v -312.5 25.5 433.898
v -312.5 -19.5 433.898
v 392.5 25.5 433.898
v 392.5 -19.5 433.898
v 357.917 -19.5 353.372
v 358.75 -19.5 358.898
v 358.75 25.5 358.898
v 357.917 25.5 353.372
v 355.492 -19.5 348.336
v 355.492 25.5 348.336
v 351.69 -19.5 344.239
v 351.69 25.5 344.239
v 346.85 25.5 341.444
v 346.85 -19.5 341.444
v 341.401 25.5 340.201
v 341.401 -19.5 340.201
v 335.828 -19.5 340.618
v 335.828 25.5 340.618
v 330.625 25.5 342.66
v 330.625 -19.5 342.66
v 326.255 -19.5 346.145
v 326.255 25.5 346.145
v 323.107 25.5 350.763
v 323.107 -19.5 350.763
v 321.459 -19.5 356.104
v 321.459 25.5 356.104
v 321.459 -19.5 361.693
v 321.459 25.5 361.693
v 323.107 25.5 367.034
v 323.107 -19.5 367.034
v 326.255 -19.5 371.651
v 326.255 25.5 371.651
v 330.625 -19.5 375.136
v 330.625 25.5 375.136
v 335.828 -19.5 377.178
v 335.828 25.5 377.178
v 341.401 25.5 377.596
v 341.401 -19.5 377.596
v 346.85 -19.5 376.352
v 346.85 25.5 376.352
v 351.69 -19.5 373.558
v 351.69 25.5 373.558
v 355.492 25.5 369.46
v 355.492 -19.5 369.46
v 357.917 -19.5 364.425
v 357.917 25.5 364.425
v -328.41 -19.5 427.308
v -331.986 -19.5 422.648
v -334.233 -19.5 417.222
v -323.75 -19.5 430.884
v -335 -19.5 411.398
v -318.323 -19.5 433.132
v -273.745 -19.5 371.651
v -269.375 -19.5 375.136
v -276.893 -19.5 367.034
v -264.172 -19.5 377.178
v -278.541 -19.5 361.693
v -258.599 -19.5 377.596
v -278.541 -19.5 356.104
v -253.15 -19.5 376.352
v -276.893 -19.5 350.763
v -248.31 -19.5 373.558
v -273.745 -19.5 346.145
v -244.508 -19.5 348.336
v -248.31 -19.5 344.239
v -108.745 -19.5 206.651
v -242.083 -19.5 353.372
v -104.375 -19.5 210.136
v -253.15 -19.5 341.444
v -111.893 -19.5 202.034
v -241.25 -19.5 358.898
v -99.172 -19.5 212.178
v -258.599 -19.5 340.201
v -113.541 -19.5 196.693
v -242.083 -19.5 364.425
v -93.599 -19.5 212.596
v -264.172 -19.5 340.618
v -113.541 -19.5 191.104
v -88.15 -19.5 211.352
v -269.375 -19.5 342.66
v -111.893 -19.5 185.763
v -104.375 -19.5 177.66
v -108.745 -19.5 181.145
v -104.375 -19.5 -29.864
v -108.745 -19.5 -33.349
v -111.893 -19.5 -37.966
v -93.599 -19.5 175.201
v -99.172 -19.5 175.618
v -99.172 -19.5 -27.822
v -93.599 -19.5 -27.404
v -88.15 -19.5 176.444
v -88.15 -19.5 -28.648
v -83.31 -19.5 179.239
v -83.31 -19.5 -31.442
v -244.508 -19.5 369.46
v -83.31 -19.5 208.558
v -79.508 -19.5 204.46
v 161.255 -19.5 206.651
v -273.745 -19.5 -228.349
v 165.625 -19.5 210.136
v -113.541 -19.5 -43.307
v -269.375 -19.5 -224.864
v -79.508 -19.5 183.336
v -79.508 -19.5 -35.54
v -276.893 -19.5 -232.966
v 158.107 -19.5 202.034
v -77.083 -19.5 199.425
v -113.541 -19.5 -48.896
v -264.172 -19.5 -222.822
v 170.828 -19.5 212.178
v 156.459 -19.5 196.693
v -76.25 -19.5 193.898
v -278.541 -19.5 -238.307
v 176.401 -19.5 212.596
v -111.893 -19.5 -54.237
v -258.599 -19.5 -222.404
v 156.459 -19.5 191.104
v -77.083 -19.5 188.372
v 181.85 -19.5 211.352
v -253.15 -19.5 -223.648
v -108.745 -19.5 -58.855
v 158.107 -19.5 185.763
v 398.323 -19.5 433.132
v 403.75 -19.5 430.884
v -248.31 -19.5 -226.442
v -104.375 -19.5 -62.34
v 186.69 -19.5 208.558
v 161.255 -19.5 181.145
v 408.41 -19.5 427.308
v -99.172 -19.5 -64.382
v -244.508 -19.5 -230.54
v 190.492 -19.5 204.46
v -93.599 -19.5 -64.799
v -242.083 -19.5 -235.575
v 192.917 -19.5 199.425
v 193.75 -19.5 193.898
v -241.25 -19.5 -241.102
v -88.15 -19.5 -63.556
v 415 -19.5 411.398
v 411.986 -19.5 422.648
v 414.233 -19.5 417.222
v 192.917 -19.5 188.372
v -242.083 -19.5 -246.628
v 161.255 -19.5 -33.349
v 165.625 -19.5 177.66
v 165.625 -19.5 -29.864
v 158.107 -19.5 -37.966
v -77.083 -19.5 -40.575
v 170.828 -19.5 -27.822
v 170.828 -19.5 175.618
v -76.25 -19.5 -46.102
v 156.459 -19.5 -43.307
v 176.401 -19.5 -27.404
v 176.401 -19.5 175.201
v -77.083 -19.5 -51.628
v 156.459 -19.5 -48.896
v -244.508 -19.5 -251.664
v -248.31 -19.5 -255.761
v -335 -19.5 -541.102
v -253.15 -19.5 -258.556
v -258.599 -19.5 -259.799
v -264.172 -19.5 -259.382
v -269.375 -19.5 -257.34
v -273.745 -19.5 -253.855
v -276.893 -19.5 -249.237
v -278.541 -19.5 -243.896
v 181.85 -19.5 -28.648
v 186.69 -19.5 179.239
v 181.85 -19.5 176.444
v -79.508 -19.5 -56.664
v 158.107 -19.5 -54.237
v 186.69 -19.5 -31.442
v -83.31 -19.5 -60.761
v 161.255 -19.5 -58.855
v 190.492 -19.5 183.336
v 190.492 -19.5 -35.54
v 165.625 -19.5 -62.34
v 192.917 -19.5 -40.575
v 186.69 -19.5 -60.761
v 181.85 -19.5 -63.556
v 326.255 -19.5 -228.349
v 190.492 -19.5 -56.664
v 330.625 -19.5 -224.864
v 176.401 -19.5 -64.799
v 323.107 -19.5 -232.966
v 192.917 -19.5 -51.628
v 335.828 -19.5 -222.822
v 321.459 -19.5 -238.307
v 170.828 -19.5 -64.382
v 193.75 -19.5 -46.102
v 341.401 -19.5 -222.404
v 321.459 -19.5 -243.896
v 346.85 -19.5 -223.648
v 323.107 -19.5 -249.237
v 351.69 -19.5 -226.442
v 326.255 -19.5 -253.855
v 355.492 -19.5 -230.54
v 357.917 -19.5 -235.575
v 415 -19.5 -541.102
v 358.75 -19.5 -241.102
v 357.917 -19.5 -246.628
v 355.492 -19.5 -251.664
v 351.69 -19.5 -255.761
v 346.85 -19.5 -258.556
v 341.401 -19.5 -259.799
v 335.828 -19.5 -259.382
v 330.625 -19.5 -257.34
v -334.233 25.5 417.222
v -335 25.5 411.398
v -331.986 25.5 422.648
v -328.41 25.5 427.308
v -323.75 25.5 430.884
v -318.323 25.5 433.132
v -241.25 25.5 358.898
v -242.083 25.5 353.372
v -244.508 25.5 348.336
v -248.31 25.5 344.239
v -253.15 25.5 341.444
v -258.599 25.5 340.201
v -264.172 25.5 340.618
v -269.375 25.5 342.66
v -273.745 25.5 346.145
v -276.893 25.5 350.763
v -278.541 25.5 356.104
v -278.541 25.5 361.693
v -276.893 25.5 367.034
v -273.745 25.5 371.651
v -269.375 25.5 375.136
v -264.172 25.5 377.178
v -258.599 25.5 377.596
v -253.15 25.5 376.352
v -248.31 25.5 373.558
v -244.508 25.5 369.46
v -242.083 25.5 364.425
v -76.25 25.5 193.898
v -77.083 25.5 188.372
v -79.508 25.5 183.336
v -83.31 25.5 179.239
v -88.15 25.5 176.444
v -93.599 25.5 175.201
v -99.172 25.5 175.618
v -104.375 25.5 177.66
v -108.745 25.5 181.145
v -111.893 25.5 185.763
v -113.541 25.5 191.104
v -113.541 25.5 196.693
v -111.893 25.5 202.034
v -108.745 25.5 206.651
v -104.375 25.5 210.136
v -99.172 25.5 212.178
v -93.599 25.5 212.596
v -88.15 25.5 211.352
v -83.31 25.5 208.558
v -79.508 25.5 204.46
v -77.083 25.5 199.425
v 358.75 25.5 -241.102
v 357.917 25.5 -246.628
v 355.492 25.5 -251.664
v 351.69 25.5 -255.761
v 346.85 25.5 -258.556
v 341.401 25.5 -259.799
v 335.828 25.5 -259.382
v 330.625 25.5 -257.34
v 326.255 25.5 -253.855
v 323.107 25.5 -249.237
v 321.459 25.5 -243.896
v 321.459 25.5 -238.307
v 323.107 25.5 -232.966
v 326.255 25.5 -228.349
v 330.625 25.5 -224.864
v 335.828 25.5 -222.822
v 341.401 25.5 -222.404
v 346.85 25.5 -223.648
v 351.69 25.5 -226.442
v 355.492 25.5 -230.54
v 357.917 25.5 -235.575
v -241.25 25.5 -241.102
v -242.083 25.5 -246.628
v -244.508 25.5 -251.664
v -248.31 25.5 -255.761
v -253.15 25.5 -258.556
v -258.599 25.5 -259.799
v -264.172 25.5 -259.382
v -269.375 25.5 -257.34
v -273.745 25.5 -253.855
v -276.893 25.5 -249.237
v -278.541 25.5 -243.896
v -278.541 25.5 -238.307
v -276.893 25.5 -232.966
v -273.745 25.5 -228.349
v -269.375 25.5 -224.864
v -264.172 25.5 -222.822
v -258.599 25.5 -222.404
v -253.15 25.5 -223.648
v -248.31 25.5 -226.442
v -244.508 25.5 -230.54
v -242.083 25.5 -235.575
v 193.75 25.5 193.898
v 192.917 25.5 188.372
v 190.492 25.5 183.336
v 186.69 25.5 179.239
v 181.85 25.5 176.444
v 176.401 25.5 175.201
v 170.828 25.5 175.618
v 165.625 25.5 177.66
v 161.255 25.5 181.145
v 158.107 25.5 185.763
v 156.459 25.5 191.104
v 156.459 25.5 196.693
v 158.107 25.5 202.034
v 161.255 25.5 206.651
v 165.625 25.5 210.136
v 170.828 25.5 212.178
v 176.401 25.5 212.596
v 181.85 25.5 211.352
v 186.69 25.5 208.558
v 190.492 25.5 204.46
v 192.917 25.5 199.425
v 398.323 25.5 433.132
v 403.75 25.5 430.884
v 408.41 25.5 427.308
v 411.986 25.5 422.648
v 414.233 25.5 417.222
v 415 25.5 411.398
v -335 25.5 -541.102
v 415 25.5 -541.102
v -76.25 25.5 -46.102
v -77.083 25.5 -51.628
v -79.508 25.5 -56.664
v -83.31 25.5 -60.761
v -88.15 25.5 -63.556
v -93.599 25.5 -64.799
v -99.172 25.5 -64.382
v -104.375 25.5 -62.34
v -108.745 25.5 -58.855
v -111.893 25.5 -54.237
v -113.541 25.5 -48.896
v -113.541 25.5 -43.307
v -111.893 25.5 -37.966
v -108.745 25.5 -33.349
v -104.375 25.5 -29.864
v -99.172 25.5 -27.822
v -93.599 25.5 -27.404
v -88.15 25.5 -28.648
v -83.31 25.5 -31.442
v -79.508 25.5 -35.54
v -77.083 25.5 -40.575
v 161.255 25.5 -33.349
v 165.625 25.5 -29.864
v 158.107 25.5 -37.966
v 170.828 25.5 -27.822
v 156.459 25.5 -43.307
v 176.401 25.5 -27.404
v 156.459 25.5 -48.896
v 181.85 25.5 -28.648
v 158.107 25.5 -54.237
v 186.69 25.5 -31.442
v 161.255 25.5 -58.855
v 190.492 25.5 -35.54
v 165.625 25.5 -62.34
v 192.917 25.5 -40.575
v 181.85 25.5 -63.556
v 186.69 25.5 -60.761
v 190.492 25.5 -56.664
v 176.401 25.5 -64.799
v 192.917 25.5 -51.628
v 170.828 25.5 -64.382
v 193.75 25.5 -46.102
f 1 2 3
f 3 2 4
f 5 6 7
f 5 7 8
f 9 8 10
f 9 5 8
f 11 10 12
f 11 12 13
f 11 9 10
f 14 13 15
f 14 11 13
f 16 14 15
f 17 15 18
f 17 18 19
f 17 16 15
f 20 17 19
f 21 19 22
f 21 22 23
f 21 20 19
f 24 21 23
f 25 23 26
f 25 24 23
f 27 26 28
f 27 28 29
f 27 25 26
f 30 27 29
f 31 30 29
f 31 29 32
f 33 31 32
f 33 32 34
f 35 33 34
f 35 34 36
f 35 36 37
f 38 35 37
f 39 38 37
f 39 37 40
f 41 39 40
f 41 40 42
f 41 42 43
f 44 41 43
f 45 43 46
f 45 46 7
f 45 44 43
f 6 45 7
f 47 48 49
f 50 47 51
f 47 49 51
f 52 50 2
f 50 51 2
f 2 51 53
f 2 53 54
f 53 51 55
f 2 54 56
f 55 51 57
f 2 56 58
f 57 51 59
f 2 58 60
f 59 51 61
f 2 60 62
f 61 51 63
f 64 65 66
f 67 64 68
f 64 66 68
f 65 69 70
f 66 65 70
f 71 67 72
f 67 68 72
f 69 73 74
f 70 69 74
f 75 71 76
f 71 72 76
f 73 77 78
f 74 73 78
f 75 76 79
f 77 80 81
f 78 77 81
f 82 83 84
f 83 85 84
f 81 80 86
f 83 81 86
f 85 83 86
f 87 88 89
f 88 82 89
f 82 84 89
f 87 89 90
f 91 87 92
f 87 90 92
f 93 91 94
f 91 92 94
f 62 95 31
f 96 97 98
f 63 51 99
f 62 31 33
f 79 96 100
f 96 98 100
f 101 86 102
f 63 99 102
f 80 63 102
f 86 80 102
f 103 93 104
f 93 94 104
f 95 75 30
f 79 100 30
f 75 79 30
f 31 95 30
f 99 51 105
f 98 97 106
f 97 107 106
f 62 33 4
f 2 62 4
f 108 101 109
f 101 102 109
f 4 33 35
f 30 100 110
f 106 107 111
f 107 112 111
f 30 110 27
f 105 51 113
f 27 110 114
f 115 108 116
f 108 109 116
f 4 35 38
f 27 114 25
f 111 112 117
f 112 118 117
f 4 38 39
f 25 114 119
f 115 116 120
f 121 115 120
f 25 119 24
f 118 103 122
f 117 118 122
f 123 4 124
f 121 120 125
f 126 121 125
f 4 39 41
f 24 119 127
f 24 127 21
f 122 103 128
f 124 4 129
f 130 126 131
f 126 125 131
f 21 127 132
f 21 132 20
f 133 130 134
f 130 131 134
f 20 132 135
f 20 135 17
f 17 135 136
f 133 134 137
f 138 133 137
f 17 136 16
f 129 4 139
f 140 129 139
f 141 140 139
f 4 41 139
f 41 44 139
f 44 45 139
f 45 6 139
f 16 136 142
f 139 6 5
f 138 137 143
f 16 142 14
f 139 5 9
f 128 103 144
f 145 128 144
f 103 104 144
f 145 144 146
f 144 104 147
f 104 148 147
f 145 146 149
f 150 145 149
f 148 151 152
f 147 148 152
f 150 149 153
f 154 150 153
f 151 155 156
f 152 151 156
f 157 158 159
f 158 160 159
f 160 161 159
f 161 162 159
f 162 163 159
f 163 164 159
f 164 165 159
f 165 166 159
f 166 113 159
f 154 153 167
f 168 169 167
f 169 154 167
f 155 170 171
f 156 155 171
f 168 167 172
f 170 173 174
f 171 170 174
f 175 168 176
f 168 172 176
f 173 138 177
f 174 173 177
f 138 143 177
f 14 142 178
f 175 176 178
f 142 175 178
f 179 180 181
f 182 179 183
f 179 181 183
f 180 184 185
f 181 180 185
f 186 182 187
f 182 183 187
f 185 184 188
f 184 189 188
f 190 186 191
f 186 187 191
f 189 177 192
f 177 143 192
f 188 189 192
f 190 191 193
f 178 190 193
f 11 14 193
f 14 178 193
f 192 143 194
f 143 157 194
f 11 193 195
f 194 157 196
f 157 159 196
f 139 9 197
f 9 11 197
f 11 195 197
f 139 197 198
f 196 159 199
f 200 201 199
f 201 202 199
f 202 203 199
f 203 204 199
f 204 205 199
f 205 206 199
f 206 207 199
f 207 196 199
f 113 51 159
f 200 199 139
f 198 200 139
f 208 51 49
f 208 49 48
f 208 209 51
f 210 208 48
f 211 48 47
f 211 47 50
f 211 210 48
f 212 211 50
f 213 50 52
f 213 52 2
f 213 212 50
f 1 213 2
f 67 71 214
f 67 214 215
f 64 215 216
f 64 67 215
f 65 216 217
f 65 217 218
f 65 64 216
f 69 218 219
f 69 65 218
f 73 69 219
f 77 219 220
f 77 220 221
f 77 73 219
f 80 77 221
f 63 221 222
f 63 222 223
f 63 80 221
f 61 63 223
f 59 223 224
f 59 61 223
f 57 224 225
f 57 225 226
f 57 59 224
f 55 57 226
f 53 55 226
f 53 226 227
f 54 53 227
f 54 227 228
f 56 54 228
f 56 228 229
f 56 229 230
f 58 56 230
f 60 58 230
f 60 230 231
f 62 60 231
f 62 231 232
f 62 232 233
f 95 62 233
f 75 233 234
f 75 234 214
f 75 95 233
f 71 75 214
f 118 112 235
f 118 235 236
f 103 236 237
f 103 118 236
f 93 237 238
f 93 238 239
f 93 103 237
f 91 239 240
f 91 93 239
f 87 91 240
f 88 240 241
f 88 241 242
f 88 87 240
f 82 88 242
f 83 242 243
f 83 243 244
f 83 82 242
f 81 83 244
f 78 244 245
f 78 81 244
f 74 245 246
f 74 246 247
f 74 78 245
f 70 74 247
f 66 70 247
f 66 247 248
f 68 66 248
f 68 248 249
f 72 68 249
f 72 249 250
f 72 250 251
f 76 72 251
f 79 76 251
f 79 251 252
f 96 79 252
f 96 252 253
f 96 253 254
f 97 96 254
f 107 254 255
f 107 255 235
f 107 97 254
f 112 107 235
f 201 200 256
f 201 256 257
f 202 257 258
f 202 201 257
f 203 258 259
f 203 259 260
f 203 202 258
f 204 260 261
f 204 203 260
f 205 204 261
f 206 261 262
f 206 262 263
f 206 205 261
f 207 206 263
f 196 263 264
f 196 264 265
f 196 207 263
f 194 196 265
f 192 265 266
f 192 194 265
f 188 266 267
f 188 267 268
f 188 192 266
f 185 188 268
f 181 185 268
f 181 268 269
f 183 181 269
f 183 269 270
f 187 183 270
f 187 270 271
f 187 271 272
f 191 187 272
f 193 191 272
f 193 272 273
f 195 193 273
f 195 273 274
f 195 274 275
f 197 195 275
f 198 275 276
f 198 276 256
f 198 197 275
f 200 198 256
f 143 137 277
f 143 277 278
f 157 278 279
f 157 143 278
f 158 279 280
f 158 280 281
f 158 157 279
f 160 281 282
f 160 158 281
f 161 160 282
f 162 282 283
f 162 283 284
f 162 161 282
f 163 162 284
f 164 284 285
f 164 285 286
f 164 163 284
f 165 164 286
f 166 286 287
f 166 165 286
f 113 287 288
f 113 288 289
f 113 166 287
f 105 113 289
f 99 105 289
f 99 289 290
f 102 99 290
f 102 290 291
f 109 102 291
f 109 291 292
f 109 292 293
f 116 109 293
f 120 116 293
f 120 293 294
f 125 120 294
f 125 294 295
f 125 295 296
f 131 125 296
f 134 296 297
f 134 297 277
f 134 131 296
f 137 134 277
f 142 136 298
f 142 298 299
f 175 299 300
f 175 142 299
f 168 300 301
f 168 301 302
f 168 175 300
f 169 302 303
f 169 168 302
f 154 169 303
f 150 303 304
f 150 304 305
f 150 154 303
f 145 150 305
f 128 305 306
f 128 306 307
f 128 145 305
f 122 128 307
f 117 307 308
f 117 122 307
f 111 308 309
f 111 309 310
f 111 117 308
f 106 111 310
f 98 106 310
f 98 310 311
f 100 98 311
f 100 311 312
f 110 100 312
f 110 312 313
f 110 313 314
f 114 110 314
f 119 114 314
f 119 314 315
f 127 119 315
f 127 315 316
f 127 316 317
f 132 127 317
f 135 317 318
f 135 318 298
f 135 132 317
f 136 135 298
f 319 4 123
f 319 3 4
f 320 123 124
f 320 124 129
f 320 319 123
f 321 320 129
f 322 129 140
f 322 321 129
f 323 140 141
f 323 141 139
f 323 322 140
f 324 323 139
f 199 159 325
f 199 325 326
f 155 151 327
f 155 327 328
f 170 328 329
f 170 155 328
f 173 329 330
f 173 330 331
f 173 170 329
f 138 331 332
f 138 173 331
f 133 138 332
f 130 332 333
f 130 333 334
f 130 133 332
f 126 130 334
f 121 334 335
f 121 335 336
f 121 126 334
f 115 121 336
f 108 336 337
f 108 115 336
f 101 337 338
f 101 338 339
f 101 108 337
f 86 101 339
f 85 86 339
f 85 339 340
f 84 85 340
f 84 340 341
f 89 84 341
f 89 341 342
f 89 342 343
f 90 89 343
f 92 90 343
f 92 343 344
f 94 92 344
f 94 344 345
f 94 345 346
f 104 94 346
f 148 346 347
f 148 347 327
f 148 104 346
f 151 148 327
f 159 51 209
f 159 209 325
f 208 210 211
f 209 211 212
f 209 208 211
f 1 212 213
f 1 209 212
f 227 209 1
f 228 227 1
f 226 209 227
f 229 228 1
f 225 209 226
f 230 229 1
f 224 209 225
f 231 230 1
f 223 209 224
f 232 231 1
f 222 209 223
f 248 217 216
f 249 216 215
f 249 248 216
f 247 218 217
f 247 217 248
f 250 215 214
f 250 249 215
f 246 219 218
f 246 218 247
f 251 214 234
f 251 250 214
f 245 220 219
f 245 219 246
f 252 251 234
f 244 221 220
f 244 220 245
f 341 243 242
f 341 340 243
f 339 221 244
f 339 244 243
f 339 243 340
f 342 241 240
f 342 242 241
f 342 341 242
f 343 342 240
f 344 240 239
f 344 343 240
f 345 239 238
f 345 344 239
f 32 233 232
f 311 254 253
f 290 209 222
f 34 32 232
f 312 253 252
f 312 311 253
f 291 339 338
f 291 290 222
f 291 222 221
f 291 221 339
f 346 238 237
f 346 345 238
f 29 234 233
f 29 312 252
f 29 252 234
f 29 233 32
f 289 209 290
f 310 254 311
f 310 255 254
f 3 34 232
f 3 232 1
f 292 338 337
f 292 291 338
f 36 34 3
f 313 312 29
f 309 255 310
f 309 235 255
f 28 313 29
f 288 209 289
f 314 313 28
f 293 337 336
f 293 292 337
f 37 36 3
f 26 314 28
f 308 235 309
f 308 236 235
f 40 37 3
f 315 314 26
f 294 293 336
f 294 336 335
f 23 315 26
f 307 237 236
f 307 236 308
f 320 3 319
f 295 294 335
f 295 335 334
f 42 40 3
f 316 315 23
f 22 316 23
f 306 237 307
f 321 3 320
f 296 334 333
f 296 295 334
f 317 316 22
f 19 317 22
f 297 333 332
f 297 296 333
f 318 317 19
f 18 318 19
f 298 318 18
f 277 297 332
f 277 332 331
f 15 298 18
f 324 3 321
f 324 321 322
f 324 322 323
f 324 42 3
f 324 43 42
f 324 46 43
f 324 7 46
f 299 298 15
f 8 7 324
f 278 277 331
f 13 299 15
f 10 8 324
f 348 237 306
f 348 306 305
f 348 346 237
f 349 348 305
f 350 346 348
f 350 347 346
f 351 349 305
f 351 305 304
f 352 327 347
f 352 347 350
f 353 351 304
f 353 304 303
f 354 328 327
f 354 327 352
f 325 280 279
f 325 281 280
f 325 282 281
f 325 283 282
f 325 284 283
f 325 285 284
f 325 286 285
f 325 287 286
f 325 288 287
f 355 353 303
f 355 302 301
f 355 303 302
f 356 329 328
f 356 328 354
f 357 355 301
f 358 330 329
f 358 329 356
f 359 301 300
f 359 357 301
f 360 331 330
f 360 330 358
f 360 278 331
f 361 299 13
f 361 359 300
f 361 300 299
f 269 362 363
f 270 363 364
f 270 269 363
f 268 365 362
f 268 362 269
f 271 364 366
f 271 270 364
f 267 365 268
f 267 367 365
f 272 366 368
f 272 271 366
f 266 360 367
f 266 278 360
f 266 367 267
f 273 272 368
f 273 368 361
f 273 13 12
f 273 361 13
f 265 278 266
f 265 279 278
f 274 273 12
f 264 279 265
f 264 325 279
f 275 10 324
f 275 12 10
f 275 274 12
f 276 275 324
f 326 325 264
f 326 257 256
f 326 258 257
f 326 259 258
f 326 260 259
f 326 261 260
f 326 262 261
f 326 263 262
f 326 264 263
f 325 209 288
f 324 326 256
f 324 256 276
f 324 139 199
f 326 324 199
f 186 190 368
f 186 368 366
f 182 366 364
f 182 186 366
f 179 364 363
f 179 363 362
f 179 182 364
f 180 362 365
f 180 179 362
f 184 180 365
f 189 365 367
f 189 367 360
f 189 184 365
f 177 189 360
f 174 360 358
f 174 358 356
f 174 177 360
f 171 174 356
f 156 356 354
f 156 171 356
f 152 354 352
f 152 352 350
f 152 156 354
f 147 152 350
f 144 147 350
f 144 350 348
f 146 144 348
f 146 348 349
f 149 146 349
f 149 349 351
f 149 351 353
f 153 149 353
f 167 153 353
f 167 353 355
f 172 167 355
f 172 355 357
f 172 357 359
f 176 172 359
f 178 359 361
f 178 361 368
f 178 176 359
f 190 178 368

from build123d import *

# Parameters (mm, degrees)
SKETCH1_W           = 100
SKETCH1_H           = 130
SKETCH1_R           = 2.5
BOSS_EXTRUDE1_DEPTH = 6
FILLET1_R           = 3
SCALE1_SCALE        = 7.5


with BuildPart() as part:
    # Sketch1 → Boss-Extrude1 (new body)
    with BuildSketch(Plane(origin=(0, 0, 0), x_dir=(1, 0, 0), z_dir=(0, 1, 0))):
        with Locations((40, 55)):
            Rectangle(SKETCH1_W, SKETCH1_H)
        Circle(SKETCH1_R, mode=Mode.SUBTRACT)
        with Locations((80, 0)):
            Circle(SKETCH1_R, mode=Mode.SUBTRACT)
        with Locations((0, 80)):
            Circle(SKETCH1_R, mode=Mode.SUBTRACT)
        with Locations((80, 80)):
            Circle(SKETCH1_R, mode=Mode.SUBTRACT)
        with Locations((22, 22)):
            Circle(SKETCH1_R, mode=Mode.SUBTRACT)
        with Locations((58, 22)):
            Circle(SKETCH1_R, mode=Mode.SUBTRACT)
        with Locations((22, 54)):
            Circle(SKETCH1_R, mode=Mode.SUBTRACT)
        with Locations((58, 54)):
            Circle(SKETCH1_R, mode=Mode.SUBTRACT)
    extrude(amount=BOSS_EXTRUDE1_DEPTH)

    # Fillet1
    fillet1_edges = [part.edges().sort_by_distance(p)[0] for p in [
        (90, 3, 10),
        (-10, 3, 10),
    ]]
    fillet(fillet1_edges, radius=FILLET1_R)


with BuildPart() as part_1:
    # Scale1: scaled about (40, 3, -55.215106893)
    add(part.part.scale(SCALE1_SCALE).moved(Location((-260, -19.5, 358.898194805))))


solid = part_1.part
